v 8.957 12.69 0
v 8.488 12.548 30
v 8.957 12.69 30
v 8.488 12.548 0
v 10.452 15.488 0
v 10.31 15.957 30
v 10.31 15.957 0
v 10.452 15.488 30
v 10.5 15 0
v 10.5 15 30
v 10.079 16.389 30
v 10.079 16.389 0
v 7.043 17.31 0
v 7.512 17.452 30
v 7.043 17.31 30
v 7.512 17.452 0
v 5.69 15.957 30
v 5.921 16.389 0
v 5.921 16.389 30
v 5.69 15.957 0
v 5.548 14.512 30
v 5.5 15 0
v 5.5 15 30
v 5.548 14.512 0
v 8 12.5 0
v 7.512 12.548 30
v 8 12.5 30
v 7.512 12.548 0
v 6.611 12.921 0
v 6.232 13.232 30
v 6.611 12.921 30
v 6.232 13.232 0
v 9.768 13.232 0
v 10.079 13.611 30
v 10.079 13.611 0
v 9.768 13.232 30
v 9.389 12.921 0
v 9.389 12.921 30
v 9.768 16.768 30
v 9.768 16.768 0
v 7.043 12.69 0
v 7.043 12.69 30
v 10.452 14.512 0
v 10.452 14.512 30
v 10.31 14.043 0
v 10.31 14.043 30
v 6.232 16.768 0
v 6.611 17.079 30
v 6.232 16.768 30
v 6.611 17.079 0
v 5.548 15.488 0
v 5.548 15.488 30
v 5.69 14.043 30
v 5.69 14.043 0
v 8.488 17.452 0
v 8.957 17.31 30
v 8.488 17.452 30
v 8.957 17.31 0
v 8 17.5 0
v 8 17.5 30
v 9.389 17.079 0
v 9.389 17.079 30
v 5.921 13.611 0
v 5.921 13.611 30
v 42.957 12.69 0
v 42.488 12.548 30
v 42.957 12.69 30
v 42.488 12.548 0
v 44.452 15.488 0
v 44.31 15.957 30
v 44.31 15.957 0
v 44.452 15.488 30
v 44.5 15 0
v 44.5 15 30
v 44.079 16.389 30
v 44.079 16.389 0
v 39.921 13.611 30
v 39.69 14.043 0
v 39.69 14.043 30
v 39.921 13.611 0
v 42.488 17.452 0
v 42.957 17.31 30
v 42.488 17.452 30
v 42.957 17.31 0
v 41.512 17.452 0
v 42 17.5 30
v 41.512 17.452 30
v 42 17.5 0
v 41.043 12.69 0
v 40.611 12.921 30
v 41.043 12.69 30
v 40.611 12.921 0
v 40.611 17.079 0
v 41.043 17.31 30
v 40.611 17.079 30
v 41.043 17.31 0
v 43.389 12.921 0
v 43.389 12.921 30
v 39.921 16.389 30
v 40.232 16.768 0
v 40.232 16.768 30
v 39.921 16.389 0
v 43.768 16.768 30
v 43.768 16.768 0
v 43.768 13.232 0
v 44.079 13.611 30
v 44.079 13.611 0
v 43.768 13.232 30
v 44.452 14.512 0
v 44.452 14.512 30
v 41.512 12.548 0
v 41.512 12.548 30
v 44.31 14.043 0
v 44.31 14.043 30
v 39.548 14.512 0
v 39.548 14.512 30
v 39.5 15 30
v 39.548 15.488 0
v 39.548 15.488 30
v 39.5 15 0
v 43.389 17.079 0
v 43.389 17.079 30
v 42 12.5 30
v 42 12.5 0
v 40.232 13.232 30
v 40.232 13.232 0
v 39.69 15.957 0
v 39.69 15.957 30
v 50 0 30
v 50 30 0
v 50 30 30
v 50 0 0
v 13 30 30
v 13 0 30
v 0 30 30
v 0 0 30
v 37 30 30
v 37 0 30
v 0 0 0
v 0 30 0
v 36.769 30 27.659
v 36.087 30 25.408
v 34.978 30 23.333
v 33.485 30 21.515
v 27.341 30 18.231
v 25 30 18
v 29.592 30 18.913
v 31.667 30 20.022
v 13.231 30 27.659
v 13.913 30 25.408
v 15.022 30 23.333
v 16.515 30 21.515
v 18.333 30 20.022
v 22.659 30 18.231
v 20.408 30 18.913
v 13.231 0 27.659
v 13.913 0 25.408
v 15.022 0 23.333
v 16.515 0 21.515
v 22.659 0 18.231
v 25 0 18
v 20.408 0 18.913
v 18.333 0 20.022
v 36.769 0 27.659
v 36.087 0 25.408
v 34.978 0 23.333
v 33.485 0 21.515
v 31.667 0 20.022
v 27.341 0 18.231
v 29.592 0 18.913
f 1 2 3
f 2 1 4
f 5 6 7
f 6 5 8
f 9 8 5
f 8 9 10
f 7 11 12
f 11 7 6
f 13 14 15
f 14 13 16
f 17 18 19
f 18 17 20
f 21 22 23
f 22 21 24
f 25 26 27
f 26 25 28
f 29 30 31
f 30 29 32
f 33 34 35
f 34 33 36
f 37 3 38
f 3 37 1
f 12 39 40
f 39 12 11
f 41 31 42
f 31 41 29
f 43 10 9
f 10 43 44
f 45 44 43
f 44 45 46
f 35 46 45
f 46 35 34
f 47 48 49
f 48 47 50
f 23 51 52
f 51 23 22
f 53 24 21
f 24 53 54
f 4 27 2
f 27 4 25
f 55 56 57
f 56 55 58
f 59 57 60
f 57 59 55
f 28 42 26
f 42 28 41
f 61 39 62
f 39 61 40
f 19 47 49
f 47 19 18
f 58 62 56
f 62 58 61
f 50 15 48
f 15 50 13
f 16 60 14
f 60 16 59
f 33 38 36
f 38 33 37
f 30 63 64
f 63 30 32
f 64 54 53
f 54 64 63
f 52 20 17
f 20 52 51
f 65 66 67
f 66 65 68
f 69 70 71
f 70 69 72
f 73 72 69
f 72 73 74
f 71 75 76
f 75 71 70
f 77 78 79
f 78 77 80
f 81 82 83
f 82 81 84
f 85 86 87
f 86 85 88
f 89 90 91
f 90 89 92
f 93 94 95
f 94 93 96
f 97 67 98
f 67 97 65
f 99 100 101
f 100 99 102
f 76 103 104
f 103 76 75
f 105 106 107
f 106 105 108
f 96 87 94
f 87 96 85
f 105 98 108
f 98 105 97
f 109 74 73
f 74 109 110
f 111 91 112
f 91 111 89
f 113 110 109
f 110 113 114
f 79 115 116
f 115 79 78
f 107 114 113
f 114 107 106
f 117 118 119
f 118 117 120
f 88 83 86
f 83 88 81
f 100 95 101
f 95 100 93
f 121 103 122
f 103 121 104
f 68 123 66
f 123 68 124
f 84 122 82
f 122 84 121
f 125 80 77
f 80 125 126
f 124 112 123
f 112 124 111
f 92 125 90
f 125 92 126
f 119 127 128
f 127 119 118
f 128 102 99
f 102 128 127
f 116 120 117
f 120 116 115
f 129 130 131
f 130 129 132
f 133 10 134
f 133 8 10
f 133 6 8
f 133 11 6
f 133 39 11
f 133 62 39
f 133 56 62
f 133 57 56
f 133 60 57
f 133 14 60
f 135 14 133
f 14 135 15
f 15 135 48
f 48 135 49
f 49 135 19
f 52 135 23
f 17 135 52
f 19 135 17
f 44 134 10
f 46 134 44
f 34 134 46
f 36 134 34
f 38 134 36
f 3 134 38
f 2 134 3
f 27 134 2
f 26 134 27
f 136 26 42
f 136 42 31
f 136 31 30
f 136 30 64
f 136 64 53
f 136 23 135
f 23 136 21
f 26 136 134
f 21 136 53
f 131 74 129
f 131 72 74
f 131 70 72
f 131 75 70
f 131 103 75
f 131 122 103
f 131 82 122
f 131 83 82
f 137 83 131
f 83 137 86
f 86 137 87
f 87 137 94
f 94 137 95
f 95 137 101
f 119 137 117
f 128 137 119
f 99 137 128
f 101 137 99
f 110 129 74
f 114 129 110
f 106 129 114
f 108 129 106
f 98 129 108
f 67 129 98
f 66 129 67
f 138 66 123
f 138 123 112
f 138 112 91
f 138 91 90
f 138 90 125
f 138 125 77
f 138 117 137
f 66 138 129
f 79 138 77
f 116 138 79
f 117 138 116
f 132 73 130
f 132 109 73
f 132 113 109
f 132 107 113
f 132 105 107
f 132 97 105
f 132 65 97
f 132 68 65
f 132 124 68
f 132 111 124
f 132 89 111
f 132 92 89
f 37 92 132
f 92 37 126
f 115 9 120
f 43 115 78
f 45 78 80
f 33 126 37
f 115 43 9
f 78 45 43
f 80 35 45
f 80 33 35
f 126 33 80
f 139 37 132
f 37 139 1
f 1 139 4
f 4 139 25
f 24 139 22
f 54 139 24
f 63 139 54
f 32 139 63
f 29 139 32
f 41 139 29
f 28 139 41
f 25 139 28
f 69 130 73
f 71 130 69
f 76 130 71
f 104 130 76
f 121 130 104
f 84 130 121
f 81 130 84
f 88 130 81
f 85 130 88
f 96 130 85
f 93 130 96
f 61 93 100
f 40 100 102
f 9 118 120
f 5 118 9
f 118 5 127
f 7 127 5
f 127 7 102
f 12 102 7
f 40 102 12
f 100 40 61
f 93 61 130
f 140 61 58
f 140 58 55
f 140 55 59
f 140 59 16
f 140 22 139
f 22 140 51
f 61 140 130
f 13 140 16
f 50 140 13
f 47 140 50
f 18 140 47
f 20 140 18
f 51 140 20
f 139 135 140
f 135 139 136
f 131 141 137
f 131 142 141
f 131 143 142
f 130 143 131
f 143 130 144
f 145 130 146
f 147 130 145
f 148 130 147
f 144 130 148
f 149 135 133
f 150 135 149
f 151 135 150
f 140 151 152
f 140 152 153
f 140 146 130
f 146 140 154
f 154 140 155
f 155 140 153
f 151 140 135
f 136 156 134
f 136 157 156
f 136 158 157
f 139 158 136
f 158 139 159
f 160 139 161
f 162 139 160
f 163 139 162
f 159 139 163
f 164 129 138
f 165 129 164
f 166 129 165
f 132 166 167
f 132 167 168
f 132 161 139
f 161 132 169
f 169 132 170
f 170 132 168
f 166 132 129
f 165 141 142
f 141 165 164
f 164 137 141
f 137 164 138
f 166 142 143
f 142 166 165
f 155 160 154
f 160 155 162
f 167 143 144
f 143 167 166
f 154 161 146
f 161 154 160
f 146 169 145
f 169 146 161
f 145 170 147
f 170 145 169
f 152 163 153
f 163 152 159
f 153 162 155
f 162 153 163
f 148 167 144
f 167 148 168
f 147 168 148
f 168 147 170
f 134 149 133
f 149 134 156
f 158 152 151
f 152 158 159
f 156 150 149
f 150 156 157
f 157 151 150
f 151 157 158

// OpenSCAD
$fn = 32;

// ----------------------------------------------------------------------
// Saddle clamp: plain shaft clamp
// ----------------------------------------------------------------------

// --- parameters (mm) ---
blk_l = 50;               // block length, X
blk_w = 30;               // block width, Y
blk_h = 30;               // block height
clamp_r = 12;             // shaft groove radius
hole_r = 2.5;             // bolt hole radius
hole_m = 8;               // bolt hole margin from the ends

saw_depth = clamp_r + 3;  // saw kerf depth

difference() {
  cube([blk_l, blk_w, blk_h]);
  translate([blk_l / 2, -1, blk_h])
    rotate([-90, 0, 0])
      cylinder(h = blk_w + 2, r = clamp_r);
  for (sx = [0, 1])
    translate([sx ? blk_l - hole_m : hole_m, blk_w / 2, -1])
      cylinder(r = hole_r, h = blk_h + 2);
}
